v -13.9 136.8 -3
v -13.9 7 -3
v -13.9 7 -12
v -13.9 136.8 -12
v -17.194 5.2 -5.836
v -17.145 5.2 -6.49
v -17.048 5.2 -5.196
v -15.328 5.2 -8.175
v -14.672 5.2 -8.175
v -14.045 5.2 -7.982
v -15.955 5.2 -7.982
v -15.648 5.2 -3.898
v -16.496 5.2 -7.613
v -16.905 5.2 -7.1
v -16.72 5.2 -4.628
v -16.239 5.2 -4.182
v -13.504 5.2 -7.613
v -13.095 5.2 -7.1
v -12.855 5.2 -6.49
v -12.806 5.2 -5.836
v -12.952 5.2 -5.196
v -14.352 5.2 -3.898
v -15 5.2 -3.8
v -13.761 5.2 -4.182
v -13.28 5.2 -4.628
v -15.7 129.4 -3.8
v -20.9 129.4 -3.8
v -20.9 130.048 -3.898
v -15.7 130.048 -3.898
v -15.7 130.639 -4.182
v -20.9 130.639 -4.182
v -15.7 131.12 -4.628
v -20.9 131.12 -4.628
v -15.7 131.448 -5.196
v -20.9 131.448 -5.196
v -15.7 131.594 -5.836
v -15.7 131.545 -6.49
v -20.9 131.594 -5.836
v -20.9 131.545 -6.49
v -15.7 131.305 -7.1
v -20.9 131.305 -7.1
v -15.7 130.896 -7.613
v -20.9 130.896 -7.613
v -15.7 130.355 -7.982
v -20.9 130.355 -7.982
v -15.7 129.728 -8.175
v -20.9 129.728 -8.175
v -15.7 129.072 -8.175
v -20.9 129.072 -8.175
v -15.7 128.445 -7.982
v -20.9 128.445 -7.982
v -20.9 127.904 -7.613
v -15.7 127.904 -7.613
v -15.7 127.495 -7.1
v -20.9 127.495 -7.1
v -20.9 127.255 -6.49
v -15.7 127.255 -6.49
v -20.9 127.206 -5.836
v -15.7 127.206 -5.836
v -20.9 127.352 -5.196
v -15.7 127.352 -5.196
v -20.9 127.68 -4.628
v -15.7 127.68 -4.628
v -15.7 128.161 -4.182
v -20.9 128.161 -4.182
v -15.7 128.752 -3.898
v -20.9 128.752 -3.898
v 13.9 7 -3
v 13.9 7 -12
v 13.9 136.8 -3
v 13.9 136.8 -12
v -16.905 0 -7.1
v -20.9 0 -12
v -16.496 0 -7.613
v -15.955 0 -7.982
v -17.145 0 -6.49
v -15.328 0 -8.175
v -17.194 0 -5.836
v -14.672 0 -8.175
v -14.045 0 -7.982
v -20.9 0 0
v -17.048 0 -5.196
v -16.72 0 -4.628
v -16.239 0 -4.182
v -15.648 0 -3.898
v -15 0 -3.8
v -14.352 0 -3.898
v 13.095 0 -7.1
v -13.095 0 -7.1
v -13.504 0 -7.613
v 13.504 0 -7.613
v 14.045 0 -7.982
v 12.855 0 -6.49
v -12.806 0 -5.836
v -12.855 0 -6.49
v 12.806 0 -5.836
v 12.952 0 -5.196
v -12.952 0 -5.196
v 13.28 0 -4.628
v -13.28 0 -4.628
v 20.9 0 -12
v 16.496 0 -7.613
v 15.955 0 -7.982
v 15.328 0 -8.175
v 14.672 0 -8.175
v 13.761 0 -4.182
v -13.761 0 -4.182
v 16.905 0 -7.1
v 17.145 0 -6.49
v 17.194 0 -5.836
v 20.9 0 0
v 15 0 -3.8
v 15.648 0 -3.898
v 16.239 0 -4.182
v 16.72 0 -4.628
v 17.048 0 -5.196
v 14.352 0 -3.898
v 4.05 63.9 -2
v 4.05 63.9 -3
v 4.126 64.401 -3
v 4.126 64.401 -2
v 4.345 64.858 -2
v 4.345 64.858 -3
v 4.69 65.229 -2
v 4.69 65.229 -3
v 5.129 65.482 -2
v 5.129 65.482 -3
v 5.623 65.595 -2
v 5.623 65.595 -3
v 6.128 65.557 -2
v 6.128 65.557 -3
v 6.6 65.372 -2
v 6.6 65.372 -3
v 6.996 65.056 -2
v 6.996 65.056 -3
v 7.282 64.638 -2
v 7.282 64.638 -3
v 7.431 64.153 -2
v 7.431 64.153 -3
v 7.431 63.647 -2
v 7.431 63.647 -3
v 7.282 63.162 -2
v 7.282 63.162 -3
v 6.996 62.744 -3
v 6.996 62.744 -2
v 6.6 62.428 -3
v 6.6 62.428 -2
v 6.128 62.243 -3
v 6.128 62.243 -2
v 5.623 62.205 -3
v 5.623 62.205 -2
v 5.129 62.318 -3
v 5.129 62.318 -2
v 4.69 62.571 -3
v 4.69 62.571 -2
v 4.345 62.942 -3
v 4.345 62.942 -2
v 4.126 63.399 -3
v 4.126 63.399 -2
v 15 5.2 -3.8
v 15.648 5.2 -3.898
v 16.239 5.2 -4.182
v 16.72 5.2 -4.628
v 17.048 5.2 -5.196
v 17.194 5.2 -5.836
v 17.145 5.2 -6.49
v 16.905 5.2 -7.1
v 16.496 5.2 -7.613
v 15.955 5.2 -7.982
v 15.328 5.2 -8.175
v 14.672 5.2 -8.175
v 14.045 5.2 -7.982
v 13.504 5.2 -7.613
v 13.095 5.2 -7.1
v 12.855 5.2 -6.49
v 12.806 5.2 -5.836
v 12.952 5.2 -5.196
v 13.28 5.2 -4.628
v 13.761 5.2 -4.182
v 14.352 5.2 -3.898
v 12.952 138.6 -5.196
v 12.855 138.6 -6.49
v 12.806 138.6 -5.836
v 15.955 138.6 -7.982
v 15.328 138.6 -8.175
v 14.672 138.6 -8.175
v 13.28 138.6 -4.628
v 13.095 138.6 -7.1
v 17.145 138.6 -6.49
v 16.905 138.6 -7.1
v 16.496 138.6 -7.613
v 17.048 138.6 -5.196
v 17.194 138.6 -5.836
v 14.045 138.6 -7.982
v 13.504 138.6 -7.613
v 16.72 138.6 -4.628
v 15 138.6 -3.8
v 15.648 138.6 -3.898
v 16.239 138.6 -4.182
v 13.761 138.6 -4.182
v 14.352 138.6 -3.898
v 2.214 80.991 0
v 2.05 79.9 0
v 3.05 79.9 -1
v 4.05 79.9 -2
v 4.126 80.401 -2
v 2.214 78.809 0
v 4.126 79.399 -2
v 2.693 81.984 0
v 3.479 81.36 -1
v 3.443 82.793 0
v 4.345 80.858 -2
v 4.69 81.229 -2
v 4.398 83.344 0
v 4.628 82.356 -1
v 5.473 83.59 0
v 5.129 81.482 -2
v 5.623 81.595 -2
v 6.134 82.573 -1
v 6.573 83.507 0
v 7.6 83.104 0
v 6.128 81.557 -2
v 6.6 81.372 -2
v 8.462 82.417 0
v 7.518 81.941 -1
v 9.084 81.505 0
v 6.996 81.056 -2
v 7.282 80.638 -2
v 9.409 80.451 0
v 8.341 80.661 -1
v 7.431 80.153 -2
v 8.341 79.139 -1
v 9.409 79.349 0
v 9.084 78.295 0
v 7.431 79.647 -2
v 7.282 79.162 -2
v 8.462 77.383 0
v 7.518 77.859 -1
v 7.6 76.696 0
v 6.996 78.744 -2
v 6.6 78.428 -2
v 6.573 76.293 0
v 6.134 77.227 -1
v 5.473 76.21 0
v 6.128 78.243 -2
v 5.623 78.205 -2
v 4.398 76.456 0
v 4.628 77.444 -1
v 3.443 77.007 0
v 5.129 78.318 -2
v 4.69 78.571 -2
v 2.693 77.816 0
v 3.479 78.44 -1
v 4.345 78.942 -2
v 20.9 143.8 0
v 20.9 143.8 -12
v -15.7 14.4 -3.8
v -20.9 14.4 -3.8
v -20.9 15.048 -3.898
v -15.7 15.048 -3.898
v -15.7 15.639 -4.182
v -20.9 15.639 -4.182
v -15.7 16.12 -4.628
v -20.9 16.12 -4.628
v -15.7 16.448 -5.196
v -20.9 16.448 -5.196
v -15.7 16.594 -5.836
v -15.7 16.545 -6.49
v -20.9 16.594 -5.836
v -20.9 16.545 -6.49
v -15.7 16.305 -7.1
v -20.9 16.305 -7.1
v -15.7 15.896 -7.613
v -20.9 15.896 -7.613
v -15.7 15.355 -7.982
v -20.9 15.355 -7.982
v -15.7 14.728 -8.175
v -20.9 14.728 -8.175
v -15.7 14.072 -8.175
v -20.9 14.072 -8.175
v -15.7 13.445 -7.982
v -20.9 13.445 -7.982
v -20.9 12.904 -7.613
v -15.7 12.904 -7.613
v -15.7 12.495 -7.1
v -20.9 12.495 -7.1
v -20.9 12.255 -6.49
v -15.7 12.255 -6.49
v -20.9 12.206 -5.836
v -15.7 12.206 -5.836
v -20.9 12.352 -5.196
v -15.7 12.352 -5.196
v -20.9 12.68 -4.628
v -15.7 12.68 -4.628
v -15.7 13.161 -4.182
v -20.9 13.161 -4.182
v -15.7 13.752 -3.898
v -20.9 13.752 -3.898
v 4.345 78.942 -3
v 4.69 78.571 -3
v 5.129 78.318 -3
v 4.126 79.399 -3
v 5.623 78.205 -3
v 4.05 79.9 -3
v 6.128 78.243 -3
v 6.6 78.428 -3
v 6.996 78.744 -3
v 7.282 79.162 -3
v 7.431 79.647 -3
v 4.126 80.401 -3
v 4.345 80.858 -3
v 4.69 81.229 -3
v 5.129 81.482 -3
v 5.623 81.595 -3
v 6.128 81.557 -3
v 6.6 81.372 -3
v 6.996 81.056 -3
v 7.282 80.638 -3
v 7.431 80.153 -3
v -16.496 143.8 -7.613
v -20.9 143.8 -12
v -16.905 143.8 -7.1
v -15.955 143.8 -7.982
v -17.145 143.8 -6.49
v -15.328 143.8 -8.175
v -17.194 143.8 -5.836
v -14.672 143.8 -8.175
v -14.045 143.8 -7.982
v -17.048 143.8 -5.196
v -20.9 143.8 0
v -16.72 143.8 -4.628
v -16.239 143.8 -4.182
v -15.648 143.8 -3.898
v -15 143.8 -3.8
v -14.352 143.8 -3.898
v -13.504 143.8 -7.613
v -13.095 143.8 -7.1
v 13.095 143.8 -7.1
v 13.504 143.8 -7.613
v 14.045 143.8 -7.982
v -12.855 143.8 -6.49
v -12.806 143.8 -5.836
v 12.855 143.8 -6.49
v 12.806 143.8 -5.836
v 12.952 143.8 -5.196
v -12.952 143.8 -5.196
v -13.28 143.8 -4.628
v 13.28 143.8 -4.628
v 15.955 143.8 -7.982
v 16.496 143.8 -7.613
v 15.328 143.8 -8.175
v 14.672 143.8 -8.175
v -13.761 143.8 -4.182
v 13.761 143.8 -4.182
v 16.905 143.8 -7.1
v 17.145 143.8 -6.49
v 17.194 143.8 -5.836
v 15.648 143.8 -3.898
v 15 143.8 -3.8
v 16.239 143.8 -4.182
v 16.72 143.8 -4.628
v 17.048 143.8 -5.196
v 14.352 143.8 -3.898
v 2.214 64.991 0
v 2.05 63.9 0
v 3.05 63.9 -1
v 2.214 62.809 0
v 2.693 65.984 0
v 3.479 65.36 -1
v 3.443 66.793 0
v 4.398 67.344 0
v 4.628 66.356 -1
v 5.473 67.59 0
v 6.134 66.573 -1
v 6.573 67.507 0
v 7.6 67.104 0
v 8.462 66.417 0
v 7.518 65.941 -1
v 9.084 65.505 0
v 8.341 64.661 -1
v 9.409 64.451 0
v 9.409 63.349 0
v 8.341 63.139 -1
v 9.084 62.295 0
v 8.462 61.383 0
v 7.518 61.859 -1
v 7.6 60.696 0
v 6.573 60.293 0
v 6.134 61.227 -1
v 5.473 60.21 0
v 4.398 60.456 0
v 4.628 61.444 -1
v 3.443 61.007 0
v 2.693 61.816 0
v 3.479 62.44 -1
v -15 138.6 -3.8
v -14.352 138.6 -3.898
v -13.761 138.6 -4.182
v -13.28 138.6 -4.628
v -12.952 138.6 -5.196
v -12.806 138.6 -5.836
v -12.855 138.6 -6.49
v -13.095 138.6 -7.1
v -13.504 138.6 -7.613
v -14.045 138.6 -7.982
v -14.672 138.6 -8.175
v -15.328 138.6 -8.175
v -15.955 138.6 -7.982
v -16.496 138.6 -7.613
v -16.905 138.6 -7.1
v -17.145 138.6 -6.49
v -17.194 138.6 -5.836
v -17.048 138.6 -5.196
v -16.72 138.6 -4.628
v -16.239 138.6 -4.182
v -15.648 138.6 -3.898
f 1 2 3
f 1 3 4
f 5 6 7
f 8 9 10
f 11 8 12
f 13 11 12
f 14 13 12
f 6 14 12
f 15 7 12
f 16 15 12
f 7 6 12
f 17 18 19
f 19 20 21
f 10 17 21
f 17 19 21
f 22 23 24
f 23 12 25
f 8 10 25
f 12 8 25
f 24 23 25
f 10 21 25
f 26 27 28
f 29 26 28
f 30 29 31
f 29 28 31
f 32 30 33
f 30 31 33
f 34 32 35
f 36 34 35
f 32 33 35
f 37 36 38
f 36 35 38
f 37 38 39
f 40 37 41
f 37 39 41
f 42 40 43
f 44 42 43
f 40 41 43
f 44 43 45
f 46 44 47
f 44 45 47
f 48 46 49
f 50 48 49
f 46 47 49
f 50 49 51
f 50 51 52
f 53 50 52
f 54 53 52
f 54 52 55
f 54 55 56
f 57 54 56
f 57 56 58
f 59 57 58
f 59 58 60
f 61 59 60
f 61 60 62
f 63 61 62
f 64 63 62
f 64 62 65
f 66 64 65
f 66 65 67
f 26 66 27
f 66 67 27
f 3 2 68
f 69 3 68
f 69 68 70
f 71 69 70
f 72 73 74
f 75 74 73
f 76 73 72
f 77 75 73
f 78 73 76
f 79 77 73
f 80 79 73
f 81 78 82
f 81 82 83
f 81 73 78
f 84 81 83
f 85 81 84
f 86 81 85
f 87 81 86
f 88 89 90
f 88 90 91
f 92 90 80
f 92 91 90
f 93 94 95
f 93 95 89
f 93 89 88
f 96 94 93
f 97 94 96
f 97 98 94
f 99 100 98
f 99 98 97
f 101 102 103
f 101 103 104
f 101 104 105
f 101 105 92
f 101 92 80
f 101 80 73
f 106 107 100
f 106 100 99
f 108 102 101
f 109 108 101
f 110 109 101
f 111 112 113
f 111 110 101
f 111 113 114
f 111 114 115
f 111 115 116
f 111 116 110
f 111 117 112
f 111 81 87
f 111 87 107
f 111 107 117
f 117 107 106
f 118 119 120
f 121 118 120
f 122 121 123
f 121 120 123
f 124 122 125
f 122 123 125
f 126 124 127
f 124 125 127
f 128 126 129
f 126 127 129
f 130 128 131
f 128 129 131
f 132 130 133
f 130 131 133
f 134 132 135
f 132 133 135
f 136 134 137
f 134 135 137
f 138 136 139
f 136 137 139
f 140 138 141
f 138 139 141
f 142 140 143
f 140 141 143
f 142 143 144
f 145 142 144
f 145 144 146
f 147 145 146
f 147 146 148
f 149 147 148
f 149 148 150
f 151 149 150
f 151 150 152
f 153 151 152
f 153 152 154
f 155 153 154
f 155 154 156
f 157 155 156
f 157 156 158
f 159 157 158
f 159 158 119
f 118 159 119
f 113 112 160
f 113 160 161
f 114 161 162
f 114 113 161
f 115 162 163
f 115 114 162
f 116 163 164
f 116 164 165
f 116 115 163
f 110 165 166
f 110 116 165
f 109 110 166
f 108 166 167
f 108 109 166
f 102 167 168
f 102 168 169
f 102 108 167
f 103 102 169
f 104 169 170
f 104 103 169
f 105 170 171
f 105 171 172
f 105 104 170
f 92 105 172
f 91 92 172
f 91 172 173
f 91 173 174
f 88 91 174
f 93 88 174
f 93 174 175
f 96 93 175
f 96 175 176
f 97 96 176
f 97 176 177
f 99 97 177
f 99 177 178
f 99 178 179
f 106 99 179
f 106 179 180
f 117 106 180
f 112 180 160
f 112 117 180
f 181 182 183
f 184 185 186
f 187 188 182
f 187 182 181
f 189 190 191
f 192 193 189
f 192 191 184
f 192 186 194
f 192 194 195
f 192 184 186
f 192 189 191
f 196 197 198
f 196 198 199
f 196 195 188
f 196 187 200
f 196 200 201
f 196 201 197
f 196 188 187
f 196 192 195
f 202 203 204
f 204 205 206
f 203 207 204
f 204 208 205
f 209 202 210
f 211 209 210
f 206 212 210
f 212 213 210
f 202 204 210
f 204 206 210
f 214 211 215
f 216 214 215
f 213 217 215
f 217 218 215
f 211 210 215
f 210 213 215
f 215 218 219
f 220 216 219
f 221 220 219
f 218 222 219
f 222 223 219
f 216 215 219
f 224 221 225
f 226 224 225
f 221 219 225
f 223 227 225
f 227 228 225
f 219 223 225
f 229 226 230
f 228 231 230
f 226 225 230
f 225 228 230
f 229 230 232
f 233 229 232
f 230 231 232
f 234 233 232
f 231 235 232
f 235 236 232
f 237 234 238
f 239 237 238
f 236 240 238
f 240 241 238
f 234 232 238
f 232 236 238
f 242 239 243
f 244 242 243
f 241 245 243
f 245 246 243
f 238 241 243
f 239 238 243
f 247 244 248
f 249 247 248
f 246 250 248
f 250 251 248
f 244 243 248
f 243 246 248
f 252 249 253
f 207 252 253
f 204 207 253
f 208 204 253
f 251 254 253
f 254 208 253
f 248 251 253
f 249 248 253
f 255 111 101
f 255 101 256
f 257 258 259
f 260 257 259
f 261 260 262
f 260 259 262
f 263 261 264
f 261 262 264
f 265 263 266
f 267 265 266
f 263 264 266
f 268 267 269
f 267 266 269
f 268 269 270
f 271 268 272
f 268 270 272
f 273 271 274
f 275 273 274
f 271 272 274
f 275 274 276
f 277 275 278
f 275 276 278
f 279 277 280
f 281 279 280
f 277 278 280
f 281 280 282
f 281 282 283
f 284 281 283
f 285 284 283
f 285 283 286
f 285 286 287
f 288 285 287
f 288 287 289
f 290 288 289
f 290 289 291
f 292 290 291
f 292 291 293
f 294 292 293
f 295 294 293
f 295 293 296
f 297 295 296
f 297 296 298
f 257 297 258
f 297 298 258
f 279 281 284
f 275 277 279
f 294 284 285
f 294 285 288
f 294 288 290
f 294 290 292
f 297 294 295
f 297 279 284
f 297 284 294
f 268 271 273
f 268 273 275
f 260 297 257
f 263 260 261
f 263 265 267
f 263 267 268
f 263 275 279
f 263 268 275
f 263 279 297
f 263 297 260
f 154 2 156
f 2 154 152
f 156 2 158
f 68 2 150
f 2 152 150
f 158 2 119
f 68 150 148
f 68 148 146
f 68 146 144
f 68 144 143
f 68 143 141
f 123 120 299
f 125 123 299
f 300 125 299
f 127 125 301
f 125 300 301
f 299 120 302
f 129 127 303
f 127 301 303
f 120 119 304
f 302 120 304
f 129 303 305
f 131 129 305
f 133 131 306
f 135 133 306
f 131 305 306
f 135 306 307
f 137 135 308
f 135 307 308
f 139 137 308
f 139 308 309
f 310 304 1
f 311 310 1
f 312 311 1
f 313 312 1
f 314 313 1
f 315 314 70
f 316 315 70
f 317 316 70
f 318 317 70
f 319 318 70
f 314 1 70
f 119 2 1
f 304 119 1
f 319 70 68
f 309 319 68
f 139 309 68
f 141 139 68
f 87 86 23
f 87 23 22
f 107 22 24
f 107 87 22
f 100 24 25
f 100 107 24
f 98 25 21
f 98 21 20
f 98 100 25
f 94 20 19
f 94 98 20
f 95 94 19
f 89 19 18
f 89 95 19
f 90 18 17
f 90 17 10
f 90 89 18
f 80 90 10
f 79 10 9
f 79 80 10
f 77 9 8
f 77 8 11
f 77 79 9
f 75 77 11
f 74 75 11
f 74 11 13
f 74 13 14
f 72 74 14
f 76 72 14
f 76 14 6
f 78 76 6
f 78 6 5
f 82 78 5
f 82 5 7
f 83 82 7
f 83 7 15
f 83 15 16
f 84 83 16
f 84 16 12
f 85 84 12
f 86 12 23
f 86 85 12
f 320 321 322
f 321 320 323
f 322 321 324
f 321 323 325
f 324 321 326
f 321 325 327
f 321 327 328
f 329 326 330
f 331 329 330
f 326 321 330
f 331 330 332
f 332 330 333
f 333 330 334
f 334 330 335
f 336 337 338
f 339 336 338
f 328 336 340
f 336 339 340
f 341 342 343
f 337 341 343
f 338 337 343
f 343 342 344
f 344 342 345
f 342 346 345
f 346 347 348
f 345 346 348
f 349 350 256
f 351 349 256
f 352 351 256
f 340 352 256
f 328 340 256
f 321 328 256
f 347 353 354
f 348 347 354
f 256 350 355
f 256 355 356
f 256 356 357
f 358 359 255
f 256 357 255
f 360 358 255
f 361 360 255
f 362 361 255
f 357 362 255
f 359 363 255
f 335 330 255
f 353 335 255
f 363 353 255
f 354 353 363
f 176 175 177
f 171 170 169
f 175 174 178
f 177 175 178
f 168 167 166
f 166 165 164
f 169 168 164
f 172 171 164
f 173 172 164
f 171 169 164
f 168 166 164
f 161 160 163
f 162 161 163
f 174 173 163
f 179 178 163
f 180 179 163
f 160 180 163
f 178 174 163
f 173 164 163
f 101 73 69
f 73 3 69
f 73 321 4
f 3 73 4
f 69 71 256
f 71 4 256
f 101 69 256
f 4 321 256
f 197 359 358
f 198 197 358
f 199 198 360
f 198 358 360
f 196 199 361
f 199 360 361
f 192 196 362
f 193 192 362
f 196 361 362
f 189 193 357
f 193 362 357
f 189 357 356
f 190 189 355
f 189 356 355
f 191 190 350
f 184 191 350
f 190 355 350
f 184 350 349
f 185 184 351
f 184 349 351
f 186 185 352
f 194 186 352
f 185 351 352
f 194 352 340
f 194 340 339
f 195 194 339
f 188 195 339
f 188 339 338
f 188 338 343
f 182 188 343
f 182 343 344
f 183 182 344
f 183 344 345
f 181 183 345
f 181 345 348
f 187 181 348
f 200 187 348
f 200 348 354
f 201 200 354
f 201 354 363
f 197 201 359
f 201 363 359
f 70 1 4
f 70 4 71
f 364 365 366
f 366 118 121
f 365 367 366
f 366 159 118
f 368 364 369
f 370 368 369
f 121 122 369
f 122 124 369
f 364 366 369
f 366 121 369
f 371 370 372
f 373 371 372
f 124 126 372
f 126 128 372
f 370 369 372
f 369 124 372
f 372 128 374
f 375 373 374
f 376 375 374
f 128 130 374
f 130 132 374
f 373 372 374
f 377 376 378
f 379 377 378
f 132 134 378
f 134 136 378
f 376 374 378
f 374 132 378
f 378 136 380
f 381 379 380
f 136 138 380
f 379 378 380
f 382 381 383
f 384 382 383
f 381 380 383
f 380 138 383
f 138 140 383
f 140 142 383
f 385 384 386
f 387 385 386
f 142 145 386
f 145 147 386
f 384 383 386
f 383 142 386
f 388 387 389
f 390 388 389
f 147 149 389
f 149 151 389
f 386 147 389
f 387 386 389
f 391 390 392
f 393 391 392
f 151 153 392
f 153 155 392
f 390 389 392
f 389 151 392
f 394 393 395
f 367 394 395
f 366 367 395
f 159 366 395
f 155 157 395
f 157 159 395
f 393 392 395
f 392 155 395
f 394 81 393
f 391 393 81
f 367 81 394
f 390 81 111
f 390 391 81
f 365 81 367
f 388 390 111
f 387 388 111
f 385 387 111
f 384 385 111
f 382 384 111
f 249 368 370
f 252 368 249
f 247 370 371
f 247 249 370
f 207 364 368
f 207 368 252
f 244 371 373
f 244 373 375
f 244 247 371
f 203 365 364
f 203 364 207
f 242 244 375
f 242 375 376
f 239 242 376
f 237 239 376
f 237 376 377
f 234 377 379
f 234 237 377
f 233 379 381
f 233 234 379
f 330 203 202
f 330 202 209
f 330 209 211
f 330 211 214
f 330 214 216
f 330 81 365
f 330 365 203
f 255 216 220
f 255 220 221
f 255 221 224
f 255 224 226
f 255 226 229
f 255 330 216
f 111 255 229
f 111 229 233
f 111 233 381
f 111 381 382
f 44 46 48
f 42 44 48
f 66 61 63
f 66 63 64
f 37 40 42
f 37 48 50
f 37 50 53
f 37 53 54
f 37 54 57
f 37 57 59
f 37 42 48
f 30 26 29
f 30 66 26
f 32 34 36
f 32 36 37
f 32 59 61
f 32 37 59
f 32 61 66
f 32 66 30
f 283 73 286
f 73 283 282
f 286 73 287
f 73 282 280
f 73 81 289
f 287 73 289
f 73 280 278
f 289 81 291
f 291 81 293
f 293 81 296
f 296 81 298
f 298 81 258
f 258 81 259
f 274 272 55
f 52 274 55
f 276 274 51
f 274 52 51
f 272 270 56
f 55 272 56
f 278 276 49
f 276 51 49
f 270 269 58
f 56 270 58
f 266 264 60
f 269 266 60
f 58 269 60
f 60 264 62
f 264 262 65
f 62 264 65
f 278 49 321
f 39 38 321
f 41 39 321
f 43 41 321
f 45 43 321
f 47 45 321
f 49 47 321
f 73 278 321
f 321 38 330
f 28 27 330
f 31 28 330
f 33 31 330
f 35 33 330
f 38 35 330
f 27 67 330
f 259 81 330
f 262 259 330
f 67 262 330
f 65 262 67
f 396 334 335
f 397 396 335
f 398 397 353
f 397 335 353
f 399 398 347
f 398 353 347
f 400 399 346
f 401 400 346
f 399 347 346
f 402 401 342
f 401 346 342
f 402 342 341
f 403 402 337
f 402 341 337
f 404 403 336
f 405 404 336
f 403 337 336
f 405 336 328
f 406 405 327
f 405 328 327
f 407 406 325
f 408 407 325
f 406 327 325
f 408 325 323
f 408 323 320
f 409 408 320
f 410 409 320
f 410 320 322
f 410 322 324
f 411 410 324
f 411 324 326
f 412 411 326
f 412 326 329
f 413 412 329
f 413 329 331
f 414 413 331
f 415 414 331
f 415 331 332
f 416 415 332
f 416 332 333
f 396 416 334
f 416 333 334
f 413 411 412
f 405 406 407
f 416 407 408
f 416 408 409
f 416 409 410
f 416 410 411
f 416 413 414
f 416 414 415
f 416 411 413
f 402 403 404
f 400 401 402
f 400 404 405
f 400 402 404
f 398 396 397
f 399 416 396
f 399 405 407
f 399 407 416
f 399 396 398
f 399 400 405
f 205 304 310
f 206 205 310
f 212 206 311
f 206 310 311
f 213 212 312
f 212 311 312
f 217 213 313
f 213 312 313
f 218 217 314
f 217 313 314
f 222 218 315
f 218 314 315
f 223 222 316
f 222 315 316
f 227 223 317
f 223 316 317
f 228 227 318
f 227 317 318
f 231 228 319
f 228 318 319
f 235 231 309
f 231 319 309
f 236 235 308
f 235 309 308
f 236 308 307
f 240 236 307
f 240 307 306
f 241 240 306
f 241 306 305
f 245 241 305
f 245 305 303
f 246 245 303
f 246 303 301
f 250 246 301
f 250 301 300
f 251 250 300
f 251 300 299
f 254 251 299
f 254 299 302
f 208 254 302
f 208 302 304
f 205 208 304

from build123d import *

# Parameters (mm, degrees)
SKETCH1_W                 = 41.8
SKETCH1_H                 = 143.8
BOSS_EXTRUDE1_DEPTH       = 12
SHELL1_T                  = -7
SHELL1_THICKNESS_2_FACE_W = 27.8
SHELL1_THICKNESS_2_FACE_H = 129.8
SHELL1_THICKNESS_2_DEPTH  = 4
SKETCH2_R                 = 2.2
CUT_EXTRUDE1_DEPTH        = 5.2
SKETCH3_R                 = 2.2
CUT_EXTRUDE2_DEPTH        = 5.2
SKETCH5_R                 = 1.7
CUT_EXTRUDE3_DEPTH        = 10
CHAMFER1_SIZE             = 2


with BuildPart() as part:
    # Sketch1 → Boss-Extrude1 (new body)
    with BuildSketch(Plane.XY):
        with Locations((0, 71.9)):
            Rectangle(SKETCH1_W, SKETCH1_H)
    extrude(amount=-BOSS_EXTRUDE1_DEPTH)

    # Shell1
    shell1_openings = [part.faces().sort_by_distance(p)[0] for p in [
        (0, 71.9, -12),
    ]]
    offset(amount=SHELL1_T, openings=shell1_openings, kind=Kind.INTERSECTION)

    # Shell1 thickness 2 face (on inner face of the shell) → Shell1 thickness 2 (cut)
    with BuildSketch(Plane(origin=(0, 71.9, -7), x_dir=(1, 0, 0), z_dir=(0, 0, 1))):
        Rectangle(SHELL1_THICKNESS_2_FACE_W, SHELL1_THICKNESS_2_FACE_H)
    extrude(amount=SHELL1_THICKNESS_2_DEPTH, mode=Mode.SUBTRACT)

    # Sketch2 → Cut-Extrude1 (cut)
    with BuildSketch(Plane(origin=(0, 143.8, 0), x_dir=(1, 0, 0), z_dir=(0, 1, 0))):
        with Locations(Location((-15, 6, 0), (0, 0, 270))):
            Circle(SKETCH2_R)
        with Locations(Location((15, 6, 0), (0, 0, 270))):
            Circle(SKETCH2_R)
    cut_extrude1 = extrude(amount=-CUT_EXTRUDE1_DEPTH, mode=Mode.SUBTRACT)

    # Mirror1: Cut-Extrude1 across plane
    add(cut_extrude1.mirror(Plane.ZX.offset(71.9)), mode=Mode.SUBTRACT)

    # Sketch3 → Cut-Extrude2 (cut)
    with BuildSketch(Plane.ZY.offset(20.9)):
        with Locations((-6, 129.4)):
            Circle(SKETCH3_R)
        with Locations((-6, 14.4)):
            Circle(SKETCH3_R)
    extrude(amount=-CUT_EXTRUDE2_DEPTH, mode=Mode.SUBTRACT)

    # Sketch5 → Cut-Extrude3 (cut)
    with BuildSketch(Plane(origin=(0, 0, -3), x_dir=(-1, 0, 0), z_dir=(0, 0, -1))):
        with Locations((-5.75, 63.9)):
            Circle(SKETCH5_R)
        with Locations((-5.75, 79.9)):
            Circle(SKETCH5_R)
    extrude(amount=-CUT_EXTRUDE3_DEPTH, mode=Mode.SUBTRACT)

    # Chamfer1
    chamfer1_edges = [part.edges().sort_by_distance(p)[0] for p in [
        (7.45, 63.9, 0),
        (7.45, 79.9, 0),
    ]]
    chamfer(chamfer1_edges, length=CHAMFER1_SIZE)


solid = part.part
